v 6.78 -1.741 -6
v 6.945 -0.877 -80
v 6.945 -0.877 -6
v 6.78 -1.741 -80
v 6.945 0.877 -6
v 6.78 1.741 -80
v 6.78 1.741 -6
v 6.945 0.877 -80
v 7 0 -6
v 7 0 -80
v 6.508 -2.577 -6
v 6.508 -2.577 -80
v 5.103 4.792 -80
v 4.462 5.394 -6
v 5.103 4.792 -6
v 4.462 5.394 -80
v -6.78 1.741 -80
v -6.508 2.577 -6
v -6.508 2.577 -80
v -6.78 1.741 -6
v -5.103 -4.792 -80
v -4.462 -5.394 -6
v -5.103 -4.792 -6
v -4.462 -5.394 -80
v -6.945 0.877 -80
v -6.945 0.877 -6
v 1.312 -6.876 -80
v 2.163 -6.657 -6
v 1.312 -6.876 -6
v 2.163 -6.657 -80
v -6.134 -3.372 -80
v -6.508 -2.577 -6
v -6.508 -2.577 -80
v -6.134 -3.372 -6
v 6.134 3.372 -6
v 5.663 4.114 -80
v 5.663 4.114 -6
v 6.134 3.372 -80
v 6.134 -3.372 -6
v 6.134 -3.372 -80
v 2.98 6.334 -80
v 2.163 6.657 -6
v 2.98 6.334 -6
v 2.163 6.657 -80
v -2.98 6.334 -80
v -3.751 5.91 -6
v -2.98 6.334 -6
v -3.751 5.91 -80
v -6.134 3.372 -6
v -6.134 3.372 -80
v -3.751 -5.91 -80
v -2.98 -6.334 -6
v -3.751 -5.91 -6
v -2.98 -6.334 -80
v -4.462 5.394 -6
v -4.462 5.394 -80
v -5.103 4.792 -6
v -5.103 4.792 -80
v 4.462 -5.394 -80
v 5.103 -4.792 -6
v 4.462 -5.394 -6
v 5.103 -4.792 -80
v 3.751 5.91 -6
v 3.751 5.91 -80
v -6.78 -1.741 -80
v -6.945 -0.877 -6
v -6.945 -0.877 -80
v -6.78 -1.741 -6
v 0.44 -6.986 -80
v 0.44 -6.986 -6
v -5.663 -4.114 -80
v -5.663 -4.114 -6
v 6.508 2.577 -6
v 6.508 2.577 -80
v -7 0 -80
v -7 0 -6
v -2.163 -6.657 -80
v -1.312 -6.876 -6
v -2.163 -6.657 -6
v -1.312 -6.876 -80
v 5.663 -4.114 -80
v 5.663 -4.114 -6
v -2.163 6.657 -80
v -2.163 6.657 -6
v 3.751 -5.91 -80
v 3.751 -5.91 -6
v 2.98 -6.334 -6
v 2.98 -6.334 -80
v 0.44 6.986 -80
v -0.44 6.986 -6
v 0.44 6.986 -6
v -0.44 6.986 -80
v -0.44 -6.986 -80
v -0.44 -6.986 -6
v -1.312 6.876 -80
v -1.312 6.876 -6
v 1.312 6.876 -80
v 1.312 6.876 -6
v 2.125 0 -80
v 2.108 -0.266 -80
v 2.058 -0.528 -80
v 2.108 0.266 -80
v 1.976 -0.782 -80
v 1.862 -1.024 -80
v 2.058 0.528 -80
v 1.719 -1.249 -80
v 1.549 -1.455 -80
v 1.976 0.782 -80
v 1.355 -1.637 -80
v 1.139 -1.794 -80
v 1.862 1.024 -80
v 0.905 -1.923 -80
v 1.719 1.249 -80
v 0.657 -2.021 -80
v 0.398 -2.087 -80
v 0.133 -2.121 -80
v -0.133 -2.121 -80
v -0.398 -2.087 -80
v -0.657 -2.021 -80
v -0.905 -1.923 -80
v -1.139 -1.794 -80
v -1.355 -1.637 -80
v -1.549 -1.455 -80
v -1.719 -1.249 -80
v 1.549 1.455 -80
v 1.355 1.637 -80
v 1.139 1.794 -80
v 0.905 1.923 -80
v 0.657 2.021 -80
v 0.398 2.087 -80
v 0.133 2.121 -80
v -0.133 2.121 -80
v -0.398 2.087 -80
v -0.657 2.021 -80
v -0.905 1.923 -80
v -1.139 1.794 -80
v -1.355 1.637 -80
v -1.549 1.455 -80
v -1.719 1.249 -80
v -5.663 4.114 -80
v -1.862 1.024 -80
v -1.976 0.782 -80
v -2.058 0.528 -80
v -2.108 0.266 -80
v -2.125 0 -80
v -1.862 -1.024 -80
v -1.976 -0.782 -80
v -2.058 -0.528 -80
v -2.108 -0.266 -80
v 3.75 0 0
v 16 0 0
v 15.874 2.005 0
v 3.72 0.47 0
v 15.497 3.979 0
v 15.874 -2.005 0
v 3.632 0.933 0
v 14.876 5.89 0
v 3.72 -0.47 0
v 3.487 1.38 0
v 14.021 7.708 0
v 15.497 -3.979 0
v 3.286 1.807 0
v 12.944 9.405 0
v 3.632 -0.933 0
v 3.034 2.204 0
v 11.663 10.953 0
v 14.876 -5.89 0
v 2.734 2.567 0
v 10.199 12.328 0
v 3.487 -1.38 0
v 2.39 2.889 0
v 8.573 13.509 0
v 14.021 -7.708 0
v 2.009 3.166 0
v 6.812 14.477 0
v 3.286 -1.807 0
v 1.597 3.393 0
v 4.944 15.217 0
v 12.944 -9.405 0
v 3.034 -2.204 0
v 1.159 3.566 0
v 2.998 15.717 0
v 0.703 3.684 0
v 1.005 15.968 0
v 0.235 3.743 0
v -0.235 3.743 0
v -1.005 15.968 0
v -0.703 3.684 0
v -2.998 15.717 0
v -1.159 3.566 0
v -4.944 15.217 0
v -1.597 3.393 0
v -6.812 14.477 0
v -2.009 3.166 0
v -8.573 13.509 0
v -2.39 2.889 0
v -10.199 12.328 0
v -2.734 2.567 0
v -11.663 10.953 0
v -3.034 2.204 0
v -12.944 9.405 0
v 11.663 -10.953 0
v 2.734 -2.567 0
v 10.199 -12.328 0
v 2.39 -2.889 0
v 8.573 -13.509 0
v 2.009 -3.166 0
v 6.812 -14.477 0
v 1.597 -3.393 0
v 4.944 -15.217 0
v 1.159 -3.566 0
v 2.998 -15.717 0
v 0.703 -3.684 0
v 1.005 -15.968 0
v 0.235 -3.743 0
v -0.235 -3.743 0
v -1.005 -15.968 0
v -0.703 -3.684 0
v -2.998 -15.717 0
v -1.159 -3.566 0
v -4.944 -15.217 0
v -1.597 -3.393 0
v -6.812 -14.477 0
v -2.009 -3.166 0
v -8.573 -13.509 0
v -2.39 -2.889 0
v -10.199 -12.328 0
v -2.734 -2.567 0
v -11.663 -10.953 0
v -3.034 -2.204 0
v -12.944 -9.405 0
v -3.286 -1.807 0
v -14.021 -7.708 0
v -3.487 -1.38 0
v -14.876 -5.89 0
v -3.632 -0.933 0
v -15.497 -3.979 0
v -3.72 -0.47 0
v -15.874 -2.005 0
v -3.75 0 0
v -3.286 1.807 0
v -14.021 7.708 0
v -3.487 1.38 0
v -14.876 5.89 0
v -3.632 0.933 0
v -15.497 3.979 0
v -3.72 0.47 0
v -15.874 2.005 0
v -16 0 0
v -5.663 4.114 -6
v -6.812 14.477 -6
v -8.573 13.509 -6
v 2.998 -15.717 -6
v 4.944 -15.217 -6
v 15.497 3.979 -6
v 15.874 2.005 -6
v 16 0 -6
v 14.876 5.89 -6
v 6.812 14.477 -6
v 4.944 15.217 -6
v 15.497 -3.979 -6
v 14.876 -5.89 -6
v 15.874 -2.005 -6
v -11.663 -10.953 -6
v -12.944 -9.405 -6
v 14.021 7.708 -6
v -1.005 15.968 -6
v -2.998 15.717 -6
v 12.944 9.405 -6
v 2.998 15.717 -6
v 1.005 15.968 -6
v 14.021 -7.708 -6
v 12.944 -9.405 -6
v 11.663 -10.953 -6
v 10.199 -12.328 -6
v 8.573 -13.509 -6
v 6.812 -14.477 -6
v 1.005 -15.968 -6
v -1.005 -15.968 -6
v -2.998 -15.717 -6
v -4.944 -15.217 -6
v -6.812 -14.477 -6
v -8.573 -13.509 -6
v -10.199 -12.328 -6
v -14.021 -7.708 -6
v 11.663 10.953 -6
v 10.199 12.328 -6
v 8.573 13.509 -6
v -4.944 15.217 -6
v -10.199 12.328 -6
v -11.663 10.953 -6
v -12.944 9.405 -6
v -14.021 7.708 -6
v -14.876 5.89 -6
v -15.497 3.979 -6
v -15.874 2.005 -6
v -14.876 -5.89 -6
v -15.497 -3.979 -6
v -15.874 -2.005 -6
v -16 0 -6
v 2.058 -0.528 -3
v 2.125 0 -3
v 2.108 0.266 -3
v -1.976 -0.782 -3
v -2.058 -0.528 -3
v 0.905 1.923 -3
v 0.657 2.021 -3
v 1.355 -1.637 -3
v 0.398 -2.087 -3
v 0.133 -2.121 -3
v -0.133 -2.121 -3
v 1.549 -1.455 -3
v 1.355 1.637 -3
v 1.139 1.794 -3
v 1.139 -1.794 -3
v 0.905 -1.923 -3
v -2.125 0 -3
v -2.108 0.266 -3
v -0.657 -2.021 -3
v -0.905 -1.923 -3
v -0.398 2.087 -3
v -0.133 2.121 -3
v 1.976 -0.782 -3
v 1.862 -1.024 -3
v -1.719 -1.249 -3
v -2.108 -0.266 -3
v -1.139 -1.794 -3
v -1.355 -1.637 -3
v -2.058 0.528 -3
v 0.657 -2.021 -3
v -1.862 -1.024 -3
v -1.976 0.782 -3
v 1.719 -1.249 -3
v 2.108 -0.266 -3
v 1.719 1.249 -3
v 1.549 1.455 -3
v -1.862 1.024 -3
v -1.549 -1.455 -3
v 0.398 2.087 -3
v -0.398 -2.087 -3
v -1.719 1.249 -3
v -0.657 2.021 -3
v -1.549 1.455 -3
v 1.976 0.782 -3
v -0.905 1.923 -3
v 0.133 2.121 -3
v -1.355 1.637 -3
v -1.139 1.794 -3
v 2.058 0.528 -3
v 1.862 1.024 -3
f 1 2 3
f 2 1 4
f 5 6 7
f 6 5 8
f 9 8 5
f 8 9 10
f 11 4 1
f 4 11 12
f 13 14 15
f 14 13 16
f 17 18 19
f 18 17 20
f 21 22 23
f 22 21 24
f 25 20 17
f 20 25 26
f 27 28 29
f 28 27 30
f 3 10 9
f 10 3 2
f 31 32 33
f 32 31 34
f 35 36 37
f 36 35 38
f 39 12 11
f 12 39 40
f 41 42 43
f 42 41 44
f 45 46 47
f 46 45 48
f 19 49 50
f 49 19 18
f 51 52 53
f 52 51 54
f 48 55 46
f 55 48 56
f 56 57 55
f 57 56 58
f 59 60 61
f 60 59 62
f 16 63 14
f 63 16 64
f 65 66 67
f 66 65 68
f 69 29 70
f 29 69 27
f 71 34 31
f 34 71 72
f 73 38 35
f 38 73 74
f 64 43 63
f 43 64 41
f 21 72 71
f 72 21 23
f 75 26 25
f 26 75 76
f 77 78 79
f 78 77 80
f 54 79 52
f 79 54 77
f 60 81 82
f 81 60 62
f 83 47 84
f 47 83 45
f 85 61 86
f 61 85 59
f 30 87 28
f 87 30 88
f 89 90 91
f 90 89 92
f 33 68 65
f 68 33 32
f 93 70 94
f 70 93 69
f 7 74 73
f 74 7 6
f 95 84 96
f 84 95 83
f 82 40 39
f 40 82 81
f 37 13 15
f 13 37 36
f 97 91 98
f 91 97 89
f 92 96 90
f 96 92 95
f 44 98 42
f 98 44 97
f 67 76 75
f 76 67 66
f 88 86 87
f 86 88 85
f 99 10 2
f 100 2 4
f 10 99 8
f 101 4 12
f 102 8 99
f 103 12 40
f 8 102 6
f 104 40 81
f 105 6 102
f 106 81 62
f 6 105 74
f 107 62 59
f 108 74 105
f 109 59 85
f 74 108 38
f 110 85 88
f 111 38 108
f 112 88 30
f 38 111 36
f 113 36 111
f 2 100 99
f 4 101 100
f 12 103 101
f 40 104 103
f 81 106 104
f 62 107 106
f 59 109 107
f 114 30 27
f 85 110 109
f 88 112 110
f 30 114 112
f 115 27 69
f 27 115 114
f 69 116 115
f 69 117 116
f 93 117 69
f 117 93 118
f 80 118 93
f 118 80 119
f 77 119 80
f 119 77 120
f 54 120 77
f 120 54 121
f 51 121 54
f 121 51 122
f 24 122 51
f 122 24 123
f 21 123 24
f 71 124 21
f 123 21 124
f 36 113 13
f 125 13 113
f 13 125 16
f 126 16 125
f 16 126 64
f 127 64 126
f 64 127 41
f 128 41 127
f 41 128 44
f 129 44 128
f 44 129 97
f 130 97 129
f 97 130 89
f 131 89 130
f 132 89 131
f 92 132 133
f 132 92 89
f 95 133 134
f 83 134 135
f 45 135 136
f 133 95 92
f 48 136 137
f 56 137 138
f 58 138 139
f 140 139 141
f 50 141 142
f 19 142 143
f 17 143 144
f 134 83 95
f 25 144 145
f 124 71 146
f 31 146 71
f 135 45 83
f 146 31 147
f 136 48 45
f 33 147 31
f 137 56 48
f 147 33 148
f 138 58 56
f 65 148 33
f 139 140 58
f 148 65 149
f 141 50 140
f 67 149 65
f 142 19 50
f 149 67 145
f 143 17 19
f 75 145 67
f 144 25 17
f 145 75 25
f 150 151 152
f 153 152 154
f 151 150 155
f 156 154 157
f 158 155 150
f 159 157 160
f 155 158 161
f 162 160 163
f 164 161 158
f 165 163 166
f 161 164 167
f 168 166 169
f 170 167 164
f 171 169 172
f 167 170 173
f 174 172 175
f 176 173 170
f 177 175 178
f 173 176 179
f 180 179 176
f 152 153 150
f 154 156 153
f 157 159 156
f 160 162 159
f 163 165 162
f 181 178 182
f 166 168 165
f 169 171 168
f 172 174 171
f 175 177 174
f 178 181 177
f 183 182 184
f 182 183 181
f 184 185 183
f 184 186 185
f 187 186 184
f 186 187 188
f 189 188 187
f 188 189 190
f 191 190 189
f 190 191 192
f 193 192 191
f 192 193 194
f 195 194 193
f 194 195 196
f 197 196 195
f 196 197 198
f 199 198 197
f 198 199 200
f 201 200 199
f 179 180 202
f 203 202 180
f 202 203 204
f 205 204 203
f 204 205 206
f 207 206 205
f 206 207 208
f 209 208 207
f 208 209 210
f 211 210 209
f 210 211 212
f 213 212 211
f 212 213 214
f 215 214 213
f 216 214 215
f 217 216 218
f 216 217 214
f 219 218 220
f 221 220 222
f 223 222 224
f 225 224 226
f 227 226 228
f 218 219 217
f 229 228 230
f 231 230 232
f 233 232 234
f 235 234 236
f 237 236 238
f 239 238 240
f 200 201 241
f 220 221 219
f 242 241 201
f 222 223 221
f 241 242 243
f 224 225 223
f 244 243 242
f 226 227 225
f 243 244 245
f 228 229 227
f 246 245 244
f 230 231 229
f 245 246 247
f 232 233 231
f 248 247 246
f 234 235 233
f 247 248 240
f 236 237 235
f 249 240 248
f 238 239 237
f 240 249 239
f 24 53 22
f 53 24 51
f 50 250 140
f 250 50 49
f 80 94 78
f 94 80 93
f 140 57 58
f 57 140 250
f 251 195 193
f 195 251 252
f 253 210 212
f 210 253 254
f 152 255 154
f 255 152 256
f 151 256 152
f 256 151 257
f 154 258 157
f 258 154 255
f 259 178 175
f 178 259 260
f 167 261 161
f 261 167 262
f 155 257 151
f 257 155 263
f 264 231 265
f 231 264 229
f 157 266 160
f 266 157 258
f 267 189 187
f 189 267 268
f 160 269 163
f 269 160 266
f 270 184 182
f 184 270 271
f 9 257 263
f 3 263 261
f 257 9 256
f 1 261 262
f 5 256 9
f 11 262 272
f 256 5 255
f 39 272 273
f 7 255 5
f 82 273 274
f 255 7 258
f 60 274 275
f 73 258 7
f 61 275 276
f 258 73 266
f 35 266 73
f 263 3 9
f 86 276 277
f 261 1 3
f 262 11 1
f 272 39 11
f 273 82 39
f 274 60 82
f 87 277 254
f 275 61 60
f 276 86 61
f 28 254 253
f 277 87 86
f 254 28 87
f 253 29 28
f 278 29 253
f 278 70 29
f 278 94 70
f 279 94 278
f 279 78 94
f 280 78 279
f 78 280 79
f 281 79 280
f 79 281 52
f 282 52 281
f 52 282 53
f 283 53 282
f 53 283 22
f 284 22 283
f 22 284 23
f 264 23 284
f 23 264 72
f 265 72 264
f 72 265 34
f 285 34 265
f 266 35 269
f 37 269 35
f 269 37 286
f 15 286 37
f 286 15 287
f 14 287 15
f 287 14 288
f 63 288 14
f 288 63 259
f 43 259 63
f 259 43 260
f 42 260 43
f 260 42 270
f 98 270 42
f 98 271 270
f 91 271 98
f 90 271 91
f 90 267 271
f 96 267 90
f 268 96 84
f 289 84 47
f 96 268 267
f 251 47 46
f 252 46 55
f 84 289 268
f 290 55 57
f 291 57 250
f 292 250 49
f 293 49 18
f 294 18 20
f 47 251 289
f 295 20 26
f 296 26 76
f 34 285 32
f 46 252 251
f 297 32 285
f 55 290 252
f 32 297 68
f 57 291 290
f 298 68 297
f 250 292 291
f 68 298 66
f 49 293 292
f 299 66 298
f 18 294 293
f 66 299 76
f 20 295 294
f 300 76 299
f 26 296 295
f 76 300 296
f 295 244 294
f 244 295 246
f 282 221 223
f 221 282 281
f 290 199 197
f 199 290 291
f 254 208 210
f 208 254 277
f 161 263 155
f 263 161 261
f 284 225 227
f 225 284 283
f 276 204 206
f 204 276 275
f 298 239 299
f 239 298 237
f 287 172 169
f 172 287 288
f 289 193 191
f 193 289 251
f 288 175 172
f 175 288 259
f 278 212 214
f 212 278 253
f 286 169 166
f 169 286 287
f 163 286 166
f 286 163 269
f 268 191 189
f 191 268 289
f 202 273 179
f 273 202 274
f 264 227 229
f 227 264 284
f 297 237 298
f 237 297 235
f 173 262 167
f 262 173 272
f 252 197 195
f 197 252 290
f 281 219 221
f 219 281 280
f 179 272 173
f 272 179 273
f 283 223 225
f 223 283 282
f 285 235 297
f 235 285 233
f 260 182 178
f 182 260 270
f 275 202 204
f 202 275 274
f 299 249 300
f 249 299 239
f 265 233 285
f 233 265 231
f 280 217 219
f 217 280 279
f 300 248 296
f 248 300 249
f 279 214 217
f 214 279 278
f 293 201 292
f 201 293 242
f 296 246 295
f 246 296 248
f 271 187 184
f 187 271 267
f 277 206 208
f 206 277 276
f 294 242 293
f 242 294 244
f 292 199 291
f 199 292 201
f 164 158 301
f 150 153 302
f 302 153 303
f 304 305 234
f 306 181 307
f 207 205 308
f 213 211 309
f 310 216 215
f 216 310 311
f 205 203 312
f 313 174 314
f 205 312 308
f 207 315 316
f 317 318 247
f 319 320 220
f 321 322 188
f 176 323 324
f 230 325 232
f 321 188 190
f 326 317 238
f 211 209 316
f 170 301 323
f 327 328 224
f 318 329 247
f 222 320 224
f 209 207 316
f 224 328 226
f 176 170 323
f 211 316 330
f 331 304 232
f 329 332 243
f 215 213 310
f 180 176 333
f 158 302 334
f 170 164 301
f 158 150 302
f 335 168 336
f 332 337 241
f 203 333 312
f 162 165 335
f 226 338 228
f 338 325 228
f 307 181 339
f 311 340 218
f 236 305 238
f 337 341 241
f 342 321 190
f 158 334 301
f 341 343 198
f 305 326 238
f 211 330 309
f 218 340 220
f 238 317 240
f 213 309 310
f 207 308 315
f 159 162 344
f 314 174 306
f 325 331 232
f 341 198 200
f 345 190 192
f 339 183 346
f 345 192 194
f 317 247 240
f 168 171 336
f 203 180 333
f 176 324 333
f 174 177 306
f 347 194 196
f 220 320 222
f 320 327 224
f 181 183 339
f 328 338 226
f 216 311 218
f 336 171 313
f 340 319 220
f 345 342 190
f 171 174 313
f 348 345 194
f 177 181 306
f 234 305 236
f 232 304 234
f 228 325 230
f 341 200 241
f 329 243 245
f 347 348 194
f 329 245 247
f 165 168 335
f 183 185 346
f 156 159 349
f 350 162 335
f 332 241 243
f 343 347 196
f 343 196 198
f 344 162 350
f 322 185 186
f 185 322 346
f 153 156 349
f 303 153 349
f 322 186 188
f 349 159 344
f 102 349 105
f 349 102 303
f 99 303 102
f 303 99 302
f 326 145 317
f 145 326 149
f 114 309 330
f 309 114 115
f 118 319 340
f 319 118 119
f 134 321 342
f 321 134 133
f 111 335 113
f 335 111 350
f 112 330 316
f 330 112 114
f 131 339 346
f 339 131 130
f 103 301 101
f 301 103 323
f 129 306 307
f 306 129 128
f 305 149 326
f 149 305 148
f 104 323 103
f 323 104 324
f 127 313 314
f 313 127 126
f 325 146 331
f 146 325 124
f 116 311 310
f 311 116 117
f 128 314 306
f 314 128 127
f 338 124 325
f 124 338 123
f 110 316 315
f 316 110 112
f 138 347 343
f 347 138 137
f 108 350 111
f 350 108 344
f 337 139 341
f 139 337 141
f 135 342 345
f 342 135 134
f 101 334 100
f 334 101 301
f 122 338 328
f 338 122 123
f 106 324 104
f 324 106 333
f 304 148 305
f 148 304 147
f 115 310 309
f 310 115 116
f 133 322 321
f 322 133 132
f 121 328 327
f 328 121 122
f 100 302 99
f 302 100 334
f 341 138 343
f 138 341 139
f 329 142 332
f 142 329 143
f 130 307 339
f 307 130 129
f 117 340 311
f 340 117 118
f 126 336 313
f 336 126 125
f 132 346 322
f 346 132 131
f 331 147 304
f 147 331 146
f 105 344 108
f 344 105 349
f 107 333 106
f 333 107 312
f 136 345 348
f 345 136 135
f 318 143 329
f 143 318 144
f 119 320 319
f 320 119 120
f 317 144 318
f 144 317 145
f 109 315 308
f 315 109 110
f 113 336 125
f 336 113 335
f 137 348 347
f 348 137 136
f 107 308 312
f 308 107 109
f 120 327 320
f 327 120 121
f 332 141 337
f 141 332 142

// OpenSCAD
$fn = 50;


difference() {
	union() {
		translate(v = [0, 0, -80.0000000000]) {
			cylinder(h = 80, r = 7.0000000000);
		}
		translate(v = [0, 0, -6.0000000000]) {
			cylinder(h = 6, r = 16.0000000000);
		}
	}
	union() {
		translate(v = [0, 0, 0]) {
			rotate(a = [0, 0, 0]) {
				difference() {
					union() {
						#translate(v = [0, 0, -80.0000000000]) {
							cylinder(h = 80, r = 2.0000000000);
						}
						#translate(v = [0, 0, -3]) {
							cylinder(h = 3, r1 = 2.1250000000, r2 = 3.7500000000);
						}
						#translate(v = [0, 0, -80.0000000000]) {
							cylinder(h = 80, r = 2.1250000000);
						}
						#translate(v = [0, 0, -80.0000000000]) {
							cylinder(h = 80, r = 2.0000000000);
						}
					}
					union();
				}
			}
		}
	}
}
